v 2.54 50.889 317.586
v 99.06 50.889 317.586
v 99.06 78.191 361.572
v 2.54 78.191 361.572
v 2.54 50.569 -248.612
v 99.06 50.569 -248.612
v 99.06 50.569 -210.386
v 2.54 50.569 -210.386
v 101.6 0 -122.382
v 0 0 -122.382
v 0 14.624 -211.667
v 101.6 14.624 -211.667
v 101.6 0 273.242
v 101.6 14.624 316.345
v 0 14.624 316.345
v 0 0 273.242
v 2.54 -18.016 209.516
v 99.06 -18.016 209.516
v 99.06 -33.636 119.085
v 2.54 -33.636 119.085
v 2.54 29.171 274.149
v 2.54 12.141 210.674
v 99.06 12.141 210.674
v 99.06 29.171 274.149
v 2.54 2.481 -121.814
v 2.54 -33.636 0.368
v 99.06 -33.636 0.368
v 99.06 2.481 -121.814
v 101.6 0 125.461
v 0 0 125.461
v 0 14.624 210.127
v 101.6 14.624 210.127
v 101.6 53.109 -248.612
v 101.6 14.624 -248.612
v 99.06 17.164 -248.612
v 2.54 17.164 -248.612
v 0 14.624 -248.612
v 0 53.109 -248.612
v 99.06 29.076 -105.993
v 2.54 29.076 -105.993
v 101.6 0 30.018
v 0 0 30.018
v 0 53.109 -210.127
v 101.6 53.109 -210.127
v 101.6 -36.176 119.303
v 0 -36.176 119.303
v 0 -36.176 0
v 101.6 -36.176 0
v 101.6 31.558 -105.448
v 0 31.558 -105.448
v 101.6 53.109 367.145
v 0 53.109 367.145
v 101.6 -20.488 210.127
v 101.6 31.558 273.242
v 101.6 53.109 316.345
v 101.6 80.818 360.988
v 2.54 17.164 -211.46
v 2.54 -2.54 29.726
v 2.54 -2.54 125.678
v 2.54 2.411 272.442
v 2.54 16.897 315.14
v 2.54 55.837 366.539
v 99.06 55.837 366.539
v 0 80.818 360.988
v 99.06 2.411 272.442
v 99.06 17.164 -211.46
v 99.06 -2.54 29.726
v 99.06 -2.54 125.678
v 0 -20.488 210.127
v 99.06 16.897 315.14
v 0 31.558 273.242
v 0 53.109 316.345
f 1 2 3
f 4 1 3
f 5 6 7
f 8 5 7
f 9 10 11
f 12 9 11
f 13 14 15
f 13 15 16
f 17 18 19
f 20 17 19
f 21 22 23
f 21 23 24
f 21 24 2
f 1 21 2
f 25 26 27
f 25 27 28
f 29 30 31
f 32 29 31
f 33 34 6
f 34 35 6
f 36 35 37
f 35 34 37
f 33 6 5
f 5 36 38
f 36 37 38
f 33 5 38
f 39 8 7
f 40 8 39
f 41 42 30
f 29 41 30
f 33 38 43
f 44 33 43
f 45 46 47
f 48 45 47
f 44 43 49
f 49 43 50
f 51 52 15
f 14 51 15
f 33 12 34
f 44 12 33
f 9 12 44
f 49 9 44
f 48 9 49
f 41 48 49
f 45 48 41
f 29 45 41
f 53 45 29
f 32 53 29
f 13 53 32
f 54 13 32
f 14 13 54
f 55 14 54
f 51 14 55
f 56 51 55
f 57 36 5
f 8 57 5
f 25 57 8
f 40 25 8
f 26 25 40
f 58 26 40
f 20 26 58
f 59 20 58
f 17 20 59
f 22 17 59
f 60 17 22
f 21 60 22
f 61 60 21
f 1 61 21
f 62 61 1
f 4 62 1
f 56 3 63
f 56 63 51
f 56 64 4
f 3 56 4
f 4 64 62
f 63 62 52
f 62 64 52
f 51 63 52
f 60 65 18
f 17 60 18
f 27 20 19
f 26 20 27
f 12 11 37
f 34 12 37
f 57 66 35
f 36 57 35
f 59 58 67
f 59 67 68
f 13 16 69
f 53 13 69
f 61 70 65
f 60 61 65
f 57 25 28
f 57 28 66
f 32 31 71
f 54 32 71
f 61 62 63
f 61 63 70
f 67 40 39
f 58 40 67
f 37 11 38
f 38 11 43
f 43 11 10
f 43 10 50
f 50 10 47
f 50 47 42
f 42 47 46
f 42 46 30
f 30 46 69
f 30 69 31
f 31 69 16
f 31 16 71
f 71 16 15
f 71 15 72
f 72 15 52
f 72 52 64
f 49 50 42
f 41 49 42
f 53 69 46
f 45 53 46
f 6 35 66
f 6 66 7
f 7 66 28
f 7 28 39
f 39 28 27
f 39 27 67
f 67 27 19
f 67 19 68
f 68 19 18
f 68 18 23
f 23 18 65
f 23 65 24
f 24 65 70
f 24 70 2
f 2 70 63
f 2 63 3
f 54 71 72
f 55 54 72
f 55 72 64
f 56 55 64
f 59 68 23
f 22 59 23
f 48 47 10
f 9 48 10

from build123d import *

# Parameters (mm, degrees)
F1_DEPTH = 101.6
F2_T     = -2.54


with BuildPart() as f1:
    # F0 (on Right) → F1 (new body)
    with BuildSketch(Plane.YZ):
        Polygon((53.1090894751, 316.3454540171), (80.8181880827, 360.9878815302), (53.1090894751, 367.1454756031), (14.6242498083, 316.3454540171), align=None)
        Polygon((31.5575774684, 273.2424150596), (53.1090894751, 316.3454540171), (14.6242498083, 316.3454540171), (0, 273.2424150596), align=None)
        Polygon((14.6242498083, 210.1272850298), (31.5575774684, 273.2424150596), (0, 273.2424150596), (-20.4879219231, 210.1272850298), align=None)
        Polygon((0, 125.4606056329), (14.6242498083, 210.1272850298), (-20.4879219231, 210.1272850298), (-36.1757530975, 119.3030314855), align=None)
        Polygon((0, 30.0181814408), (0, 125.4606056329), (-36.1757530975, 119.3030314855), (-36.1757530975, 0), align=None)
        Polygon((31.5575774684, -105.4484846724), (0, 30.0181814408), (-36.1757530975, 0), (0, -122.3818185592), align=None)
        Polygon((53.1090894751, -210.1272850298), (31.5575774684, -105.4484846724), (0, -122.3818185592), (14.6242498083, -211.6666735853), align=None)
        Polygon((53.1090894751, -248.6121184698), (53.1090894751, -210.1272850298), (14.6242498083, -211.6666735853), (14.6242498083, -248.6121184698), align=None)
    extrude(amount=F1_DEPTH)

    # F2
    f2_openings = [f1.faces().sort_by_distance(p)[0] for p in [
        (50.8, 66.963639, 364.066679),
        (50.8, 33.86667, -248.612118),
    ]]
    offset(amount=F2_T, openings=f2_openings, kind=Kind.INTERSECTION)


solid = f1.part
